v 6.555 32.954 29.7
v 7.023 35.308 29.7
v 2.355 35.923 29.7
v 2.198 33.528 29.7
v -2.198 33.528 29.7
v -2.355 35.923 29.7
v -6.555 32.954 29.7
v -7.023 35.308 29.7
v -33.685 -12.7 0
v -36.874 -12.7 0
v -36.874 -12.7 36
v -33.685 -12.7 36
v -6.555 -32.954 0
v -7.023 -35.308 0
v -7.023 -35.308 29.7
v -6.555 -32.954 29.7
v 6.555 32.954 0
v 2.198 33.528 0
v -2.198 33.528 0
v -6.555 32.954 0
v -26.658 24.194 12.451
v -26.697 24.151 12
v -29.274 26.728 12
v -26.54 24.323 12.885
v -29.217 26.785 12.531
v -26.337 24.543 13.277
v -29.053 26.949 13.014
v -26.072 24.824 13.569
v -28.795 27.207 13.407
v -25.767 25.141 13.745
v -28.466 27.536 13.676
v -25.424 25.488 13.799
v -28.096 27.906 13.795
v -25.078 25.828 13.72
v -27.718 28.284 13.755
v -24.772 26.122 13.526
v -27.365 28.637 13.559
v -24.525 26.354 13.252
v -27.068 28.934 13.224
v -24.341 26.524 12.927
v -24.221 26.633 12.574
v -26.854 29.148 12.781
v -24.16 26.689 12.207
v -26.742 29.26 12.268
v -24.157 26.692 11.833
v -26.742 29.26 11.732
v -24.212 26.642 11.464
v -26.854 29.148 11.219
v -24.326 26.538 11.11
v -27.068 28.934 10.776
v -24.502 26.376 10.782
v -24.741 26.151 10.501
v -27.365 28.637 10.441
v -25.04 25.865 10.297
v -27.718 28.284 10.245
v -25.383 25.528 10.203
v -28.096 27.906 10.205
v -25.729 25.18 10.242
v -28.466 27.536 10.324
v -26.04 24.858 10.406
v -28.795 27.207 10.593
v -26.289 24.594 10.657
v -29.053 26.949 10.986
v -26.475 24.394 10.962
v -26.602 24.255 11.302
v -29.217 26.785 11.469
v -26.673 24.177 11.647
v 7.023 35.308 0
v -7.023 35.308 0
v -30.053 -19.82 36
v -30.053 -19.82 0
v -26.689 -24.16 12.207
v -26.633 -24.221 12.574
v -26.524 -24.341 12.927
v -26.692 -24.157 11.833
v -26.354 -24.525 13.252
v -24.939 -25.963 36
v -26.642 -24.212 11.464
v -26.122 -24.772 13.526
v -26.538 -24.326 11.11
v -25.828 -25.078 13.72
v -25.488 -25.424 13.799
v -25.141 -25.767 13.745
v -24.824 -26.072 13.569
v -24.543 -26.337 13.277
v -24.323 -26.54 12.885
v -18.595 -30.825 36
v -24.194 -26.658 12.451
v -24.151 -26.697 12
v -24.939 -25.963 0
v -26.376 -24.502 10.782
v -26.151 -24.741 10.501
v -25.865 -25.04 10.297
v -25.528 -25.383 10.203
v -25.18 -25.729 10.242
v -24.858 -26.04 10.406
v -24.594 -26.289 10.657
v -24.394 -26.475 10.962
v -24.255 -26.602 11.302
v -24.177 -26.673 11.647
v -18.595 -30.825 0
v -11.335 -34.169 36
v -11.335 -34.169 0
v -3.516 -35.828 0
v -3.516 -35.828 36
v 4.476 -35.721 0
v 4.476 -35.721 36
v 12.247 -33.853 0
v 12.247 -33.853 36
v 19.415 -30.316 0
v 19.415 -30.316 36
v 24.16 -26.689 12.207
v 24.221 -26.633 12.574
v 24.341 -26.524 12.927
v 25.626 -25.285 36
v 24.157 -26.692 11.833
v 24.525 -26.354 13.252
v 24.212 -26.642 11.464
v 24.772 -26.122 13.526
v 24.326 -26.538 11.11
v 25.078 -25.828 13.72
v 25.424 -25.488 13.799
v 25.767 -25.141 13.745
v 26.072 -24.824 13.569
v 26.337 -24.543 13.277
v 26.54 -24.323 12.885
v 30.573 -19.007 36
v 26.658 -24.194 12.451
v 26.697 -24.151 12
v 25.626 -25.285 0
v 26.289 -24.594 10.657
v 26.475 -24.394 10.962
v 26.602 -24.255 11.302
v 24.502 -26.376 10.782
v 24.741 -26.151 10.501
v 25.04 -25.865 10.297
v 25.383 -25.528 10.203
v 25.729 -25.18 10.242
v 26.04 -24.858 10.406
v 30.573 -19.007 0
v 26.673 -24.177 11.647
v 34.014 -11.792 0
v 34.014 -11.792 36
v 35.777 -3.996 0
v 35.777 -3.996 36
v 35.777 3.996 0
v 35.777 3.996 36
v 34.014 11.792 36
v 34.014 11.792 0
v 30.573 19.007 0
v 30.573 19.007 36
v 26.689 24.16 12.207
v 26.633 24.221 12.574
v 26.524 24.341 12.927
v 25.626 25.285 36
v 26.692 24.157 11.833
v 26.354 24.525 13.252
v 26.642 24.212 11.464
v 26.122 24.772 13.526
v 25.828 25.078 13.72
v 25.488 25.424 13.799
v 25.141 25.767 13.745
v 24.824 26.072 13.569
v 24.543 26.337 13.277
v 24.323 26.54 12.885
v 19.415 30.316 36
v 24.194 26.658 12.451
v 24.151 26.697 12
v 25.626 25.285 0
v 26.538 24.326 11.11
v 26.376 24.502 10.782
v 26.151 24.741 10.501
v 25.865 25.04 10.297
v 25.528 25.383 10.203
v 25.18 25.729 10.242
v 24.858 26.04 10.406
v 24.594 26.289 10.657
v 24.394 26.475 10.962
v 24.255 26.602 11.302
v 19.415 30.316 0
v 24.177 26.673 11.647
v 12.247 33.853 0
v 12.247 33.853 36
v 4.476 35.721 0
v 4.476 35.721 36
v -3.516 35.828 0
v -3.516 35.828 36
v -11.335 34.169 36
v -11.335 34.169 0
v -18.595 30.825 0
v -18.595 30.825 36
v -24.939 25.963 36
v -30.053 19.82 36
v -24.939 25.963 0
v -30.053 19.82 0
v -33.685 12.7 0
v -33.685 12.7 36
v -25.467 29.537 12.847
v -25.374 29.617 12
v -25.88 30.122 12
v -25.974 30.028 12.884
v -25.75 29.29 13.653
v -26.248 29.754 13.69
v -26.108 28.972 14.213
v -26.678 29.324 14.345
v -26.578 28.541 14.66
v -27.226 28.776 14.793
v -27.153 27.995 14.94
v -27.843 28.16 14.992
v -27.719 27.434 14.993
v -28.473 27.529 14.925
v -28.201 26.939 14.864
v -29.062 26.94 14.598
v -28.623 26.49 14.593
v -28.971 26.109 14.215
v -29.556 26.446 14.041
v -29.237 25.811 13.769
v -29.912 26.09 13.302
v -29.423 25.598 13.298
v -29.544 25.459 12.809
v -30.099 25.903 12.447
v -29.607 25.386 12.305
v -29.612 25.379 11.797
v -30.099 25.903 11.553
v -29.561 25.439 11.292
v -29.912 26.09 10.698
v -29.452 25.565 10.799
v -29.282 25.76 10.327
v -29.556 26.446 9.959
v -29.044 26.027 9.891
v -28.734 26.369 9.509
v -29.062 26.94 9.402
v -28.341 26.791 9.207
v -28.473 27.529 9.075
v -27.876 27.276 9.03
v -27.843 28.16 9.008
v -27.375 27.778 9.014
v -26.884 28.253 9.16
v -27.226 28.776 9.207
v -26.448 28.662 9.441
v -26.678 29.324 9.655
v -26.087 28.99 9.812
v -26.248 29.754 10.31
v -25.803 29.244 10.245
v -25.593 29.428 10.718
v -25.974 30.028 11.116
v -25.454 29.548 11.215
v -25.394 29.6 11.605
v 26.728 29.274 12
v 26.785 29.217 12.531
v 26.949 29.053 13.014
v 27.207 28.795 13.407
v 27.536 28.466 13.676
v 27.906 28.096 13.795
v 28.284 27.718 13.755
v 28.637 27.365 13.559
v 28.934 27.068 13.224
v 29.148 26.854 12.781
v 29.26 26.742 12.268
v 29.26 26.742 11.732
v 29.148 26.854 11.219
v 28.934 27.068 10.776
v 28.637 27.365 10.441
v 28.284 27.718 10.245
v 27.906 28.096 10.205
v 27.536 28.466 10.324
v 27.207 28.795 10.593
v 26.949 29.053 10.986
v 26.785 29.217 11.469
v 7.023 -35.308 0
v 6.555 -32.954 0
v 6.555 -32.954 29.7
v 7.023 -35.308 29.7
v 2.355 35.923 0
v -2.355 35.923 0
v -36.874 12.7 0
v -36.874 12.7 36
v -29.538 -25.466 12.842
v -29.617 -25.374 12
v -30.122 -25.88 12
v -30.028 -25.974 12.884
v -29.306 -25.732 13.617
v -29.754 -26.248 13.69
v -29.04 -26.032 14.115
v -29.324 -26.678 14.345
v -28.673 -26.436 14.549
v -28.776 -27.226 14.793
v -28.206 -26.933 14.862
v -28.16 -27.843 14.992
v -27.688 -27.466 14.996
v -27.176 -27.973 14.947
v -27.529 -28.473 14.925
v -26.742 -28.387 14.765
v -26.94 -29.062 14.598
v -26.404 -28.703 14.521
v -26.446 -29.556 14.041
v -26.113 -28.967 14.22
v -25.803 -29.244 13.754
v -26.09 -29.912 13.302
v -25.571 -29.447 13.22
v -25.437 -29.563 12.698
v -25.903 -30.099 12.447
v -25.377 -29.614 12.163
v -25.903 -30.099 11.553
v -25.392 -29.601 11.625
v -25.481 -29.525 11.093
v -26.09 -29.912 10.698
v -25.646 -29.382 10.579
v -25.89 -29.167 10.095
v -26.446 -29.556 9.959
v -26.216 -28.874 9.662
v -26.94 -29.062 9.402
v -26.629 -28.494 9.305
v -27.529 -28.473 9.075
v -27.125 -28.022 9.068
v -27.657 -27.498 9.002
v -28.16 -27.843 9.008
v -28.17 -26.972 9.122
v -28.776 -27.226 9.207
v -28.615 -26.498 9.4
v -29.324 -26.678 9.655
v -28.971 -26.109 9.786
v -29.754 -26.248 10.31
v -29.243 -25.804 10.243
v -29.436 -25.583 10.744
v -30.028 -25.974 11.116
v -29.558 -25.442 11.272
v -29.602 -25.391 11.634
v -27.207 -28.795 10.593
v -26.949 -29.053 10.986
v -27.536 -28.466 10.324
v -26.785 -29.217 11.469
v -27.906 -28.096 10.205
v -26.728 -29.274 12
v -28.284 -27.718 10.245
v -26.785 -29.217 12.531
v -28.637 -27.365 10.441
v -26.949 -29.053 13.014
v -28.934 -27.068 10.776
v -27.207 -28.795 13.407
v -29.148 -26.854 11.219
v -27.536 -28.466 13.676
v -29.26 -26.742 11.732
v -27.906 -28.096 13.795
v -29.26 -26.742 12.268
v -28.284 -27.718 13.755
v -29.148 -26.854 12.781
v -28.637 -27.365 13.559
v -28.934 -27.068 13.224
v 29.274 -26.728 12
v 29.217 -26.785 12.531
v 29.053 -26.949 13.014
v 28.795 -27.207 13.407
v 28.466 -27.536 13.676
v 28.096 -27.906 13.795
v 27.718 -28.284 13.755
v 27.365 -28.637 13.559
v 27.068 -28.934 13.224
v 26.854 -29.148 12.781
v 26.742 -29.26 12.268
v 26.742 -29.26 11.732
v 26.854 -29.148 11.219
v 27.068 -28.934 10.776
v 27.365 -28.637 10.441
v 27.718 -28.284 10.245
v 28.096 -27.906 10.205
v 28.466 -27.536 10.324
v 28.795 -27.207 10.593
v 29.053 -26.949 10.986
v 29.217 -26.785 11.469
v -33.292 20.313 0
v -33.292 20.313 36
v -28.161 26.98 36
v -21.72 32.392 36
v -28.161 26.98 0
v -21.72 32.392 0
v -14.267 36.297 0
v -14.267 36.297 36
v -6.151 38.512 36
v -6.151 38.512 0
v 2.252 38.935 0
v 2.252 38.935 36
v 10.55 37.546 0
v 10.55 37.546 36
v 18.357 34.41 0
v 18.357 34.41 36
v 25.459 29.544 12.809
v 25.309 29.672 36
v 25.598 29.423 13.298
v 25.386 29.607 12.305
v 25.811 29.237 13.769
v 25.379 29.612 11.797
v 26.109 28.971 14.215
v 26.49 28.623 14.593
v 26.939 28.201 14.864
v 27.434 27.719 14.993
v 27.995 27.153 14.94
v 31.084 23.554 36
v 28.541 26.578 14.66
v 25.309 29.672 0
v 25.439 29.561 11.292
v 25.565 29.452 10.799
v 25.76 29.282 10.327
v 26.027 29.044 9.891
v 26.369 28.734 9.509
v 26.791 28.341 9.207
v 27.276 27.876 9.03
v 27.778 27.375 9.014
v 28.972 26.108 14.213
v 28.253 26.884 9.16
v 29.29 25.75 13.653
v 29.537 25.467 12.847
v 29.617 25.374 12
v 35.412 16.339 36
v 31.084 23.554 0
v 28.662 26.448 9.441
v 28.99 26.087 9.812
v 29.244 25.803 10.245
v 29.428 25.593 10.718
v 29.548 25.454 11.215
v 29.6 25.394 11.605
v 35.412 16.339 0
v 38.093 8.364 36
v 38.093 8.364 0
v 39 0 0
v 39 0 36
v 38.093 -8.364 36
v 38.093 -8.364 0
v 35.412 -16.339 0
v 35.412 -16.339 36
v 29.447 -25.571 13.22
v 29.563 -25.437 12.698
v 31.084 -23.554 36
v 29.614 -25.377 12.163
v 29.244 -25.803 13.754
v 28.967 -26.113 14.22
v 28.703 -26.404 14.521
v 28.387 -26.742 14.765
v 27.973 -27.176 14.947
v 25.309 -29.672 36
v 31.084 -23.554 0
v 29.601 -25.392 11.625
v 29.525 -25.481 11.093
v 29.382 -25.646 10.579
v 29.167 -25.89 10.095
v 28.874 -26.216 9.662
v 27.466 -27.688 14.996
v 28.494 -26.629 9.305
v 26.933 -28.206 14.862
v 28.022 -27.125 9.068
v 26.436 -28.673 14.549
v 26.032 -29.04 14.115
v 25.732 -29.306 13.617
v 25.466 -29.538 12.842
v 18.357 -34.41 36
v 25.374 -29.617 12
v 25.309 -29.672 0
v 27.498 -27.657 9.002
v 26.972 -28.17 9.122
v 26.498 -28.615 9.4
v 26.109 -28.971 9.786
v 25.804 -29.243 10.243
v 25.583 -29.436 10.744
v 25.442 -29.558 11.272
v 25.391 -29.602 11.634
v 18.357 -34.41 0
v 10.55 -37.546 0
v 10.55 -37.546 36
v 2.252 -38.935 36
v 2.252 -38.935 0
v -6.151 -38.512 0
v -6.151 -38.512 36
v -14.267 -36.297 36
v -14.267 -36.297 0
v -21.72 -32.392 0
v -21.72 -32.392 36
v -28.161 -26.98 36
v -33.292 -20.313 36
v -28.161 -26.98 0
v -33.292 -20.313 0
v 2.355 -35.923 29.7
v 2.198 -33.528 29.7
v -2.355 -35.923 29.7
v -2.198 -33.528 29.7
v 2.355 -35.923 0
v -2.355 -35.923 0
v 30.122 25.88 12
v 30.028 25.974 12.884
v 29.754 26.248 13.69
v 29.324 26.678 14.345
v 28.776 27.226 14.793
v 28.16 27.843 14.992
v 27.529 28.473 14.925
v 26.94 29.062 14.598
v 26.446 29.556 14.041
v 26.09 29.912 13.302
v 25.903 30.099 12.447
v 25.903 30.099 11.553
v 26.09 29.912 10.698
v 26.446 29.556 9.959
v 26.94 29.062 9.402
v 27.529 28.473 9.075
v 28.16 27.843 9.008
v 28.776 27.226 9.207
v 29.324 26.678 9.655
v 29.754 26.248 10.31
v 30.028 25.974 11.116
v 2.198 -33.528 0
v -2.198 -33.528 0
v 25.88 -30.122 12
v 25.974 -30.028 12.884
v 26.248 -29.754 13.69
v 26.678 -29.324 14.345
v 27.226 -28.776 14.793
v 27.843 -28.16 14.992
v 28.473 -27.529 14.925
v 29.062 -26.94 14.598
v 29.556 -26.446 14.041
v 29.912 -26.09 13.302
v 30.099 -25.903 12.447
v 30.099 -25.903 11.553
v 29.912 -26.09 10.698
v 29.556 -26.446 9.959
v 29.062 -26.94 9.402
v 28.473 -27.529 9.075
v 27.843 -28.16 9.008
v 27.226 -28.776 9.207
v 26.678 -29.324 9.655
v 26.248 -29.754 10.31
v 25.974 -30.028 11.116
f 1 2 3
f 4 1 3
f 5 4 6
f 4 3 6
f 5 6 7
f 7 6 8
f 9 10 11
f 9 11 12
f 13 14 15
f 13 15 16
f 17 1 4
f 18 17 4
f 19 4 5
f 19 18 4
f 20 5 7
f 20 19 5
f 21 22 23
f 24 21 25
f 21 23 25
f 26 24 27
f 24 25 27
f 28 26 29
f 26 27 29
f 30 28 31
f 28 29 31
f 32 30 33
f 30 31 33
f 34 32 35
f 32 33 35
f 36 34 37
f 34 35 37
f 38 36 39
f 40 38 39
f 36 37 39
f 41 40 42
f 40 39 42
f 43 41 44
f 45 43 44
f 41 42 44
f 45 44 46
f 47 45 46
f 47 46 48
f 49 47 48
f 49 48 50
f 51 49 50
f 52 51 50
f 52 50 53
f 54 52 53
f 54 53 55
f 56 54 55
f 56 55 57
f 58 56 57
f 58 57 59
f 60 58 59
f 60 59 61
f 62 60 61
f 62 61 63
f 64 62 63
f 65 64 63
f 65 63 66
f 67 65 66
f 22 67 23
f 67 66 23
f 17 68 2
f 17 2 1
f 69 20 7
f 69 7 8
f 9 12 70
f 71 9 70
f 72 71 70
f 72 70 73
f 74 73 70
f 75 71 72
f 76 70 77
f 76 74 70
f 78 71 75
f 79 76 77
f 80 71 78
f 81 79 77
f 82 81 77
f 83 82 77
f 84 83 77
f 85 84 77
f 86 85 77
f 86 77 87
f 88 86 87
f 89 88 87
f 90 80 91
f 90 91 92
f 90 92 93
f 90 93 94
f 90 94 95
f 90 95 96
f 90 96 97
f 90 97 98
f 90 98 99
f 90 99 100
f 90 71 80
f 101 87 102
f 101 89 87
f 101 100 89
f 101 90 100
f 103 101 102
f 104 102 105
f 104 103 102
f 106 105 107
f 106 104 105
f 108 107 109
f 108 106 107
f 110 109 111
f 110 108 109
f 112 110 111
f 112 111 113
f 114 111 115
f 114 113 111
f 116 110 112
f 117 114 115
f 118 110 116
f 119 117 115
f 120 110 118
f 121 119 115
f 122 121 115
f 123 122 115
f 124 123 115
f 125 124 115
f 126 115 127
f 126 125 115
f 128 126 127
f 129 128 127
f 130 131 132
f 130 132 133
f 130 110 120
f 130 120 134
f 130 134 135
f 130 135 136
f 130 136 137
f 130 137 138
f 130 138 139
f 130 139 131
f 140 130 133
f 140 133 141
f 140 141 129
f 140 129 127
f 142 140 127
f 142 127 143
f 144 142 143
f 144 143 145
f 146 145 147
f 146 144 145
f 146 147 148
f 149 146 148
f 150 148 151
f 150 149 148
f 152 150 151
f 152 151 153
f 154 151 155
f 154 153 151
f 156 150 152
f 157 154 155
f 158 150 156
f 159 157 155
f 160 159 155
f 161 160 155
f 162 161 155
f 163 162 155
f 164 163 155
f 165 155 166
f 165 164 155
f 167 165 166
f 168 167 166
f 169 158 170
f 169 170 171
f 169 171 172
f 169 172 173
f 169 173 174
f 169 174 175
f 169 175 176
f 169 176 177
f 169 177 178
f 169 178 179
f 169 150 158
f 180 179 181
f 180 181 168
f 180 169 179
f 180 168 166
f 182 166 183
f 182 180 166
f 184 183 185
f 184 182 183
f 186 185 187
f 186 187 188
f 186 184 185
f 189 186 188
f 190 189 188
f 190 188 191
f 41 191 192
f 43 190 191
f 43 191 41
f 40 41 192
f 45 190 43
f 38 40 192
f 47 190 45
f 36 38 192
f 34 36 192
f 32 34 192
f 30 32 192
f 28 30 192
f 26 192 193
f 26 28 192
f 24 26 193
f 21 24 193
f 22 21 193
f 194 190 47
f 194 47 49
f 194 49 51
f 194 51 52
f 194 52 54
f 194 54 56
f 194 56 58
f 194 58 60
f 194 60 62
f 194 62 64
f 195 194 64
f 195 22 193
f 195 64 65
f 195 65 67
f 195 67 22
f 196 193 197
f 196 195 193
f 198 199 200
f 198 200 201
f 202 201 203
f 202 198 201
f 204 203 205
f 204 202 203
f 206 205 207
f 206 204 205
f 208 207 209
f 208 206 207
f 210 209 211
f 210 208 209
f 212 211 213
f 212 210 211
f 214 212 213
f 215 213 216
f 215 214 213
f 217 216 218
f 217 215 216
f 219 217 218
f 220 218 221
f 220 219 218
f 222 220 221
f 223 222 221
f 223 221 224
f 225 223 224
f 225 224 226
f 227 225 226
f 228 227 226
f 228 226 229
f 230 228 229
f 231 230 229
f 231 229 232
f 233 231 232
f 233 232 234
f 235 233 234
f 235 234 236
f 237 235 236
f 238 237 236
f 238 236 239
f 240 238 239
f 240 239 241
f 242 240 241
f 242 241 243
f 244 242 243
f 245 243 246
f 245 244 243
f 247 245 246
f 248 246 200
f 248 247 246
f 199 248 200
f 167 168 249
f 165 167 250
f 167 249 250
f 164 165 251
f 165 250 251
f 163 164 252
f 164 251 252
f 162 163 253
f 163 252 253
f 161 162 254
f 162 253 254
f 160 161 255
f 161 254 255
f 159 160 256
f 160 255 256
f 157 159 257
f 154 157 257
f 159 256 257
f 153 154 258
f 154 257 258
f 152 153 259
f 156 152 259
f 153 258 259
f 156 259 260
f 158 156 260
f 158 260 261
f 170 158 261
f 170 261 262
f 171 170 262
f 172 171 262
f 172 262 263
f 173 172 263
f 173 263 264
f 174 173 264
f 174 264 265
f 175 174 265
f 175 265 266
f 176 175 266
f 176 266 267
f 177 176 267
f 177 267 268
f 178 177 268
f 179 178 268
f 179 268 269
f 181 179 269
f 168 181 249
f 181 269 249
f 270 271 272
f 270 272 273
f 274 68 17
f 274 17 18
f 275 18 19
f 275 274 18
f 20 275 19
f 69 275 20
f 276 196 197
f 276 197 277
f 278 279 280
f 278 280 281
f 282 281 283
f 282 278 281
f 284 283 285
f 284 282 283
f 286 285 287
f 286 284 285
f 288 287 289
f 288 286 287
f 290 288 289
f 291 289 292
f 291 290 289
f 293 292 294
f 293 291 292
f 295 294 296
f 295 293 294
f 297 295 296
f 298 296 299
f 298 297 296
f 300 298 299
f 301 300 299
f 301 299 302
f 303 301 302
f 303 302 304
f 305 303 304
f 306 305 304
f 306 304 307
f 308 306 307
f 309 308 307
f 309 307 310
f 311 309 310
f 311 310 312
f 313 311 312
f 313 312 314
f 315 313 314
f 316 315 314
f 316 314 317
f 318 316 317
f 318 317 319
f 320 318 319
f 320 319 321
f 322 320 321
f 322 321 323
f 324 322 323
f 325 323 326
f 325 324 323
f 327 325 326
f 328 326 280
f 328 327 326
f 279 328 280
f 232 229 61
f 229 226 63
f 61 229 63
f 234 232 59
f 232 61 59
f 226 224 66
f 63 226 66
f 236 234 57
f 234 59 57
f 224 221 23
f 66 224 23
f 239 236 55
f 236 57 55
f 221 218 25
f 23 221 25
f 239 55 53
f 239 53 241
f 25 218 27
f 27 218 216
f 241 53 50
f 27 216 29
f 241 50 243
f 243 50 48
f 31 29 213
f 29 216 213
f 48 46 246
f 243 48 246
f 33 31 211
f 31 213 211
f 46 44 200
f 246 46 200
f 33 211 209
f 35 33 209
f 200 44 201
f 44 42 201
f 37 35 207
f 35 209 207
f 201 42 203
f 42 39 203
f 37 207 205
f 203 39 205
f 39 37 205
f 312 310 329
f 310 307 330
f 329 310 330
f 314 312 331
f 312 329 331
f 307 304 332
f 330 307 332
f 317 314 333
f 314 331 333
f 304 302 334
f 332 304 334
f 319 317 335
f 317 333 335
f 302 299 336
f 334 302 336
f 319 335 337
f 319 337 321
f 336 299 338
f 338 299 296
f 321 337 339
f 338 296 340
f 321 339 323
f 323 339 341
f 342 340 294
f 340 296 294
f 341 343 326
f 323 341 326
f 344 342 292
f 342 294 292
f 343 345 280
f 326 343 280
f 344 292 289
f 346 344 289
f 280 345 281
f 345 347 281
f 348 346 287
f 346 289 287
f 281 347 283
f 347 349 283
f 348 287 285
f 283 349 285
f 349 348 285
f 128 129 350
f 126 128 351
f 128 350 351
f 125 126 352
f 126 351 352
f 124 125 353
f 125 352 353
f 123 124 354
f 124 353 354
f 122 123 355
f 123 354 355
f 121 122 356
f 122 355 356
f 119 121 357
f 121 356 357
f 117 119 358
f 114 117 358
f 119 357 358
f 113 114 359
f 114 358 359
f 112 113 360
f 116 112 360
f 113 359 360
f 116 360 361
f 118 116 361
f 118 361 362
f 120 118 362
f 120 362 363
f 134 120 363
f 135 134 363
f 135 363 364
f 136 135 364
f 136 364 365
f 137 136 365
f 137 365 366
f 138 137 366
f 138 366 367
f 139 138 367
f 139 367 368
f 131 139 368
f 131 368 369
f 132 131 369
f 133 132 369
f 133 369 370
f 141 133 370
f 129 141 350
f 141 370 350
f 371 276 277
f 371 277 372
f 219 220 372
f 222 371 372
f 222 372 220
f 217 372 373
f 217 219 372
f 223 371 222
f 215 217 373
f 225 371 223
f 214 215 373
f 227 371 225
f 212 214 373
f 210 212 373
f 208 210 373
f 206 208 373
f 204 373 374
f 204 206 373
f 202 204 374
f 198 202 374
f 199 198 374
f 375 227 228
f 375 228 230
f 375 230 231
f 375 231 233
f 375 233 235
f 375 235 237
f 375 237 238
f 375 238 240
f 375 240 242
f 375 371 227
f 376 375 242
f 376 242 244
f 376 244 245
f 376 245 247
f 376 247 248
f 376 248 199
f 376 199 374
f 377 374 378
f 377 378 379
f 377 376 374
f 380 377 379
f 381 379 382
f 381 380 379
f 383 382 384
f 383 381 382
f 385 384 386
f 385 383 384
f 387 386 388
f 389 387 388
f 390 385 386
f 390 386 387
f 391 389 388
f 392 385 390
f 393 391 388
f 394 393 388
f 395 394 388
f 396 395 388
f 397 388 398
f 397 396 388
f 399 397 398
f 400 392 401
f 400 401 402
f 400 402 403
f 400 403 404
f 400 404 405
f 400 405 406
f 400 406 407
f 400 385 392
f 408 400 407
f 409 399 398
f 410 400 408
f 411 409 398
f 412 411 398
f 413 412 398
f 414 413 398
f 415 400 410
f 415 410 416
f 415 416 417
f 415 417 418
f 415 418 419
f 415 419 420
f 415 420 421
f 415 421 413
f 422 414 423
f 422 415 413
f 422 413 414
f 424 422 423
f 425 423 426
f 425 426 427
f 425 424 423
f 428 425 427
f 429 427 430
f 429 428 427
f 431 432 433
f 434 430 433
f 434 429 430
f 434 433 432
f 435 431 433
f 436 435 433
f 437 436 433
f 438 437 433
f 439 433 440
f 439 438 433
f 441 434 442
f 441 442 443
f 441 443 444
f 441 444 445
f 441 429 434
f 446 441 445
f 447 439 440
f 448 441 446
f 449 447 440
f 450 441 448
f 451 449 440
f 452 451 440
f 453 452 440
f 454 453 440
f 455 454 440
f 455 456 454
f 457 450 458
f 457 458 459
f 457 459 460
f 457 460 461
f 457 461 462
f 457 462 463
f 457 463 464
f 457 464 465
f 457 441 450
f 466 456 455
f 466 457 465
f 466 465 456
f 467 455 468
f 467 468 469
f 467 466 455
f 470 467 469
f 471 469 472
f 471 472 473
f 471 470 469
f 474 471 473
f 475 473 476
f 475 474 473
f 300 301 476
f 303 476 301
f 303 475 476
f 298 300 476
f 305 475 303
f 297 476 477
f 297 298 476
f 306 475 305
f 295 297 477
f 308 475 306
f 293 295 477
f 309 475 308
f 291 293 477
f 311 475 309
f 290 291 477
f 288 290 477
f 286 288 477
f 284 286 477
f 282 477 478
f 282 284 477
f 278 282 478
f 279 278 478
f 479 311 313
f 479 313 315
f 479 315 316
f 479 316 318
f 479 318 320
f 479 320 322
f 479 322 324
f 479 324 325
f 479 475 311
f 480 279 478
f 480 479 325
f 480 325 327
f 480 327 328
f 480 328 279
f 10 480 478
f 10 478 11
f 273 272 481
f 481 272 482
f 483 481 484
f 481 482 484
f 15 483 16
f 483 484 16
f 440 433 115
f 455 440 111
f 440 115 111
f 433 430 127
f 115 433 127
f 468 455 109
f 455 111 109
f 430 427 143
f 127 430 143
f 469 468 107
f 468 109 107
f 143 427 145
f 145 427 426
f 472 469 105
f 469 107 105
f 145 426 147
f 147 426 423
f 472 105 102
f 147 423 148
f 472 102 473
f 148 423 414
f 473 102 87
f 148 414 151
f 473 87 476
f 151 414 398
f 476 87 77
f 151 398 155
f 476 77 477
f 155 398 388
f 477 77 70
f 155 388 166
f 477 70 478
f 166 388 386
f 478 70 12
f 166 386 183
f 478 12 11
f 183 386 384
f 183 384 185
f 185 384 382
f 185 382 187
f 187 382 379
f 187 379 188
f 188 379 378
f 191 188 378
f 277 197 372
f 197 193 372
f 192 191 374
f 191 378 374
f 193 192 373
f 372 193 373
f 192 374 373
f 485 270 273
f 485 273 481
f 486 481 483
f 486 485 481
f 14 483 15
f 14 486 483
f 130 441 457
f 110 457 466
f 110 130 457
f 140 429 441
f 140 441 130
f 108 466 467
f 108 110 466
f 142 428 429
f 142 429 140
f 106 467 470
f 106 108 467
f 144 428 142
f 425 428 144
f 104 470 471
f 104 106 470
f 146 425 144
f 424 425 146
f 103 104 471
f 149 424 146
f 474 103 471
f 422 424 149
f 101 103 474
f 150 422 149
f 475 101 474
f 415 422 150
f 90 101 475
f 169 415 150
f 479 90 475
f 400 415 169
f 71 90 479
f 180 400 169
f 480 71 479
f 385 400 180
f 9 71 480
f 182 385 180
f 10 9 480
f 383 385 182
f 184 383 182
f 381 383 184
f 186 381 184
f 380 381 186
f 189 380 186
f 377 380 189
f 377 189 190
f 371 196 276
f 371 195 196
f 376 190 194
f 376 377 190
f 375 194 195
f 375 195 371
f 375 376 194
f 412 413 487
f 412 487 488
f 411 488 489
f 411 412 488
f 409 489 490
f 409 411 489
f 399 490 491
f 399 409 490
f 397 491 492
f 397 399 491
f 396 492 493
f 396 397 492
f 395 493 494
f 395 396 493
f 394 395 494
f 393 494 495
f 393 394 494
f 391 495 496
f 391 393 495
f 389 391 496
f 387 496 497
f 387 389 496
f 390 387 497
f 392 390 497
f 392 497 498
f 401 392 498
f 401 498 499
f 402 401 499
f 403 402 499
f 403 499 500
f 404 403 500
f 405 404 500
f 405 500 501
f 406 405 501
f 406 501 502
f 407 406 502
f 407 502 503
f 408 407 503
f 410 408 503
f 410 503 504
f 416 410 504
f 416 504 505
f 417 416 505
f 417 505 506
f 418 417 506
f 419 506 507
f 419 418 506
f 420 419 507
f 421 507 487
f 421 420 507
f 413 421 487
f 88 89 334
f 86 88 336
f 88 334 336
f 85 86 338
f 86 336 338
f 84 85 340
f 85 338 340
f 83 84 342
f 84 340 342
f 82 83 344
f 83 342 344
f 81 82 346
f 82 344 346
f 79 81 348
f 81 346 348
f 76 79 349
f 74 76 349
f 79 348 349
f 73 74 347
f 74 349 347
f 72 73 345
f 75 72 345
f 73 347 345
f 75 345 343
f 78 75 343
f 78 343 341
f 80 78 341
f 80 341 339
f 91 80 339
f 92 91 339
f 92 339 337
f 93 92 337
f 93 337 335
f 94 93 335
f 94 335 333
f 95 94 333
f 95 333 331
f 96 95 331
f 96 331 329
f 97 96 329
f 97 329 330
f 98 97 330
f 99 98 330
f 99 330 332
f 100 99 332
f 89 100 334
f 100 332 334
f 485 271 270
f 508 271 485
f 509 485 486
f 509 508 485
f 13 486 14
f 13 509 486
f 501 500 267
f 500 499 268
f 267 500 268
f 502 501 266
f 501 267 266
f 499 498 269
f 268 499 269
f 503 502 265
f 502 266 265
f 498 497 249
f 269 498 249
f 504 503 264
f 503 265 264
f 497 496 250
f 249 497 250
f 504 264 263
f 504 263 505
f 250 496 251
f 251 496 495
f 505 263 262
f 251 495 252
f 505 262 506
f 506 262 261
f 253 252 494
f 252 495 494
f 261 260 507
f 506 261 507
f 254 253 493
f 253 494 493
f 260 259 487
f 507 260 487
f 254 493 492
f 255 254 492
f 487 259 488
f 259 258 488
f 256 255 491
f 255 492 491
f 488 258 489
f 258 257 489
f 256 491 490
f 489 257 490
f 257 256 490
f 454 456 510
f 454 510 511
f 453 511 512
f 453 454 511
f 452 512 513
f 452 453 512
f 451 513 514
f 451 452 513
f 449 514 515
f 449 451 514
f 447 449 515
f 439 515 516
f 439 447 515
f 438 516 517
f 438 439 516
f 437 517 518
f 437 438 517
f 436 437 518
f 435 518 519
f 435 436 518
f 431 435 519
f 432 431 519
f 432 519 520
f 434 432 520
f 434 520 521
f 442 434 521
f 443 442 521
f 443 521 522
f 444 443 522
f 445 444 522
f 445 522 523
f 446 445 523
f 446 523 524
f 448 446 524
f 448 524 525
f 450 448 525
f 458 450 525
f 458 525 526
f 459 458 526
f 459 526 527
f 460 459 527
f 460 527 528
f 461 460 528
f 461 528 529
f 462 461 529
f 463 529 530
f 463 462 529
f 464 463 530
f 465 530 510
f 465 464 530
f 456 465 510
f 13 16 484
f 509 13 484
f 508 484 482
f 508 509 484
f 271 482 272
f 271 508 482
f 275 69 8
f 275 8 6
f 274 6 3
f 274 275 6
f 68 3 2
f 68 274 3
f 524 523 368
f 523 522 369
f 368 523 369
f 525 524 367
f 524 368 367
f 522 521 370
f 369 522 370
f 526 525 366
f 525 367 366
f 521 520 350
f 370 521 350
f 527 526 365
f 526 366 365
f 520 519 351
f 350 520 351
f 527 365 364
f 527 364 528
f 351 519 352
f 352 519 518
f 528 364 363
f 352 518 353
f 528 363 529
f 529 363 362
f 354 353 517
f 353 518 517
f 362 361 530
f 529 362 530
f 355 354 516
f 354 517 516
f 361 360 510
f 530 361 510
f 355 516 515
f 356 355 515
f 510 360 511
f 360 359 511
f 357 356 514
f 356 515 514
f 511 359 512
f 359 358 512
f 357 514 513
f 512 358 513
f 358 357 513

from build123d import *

# Parameters (mm, degrees)
BOSS_EXTRUDE1_DEPTH     = 36
BOSS_EXTRUDE2_DEPTH     = 29.7
BOSS_EXTRUDE2_2_DEPTH   = 29.7
SKETCH3_R               = 3
BOSS_EXTRUDE3_DEPTH     = 1.8
CUT_EXTRUDE1_REACH      = 103.362
CUT_EXTRUDE1_END_RADIUS = 36
SKETCH4_R               = 1.8
CIRPATTERN1_COUNT       = 4


with BuildPart() as part:
    # Sketch1 → Boss-Extrude1 (new body)
    with BuildSketch(Plane.XY):
        with BuildLine():
            Line((-33.685456803, 12.7), (-36.874245755, 12.7))
            ThreePointArc((-36.874245755, 12.7), (39, 0), (-36.874245755, -12.7))
            Line((-36.874245755, -12.7), (-33.685456803, -12.7))
            ThreePointArc((-33.685456803, -12.7), (36, 0), (-33.685456803, 12.7))
        make_face()
    extrude(amount=BOSS_EXTRUDE1_DEPTH)

    # Sketch3 → Boss-Extrude3 (add)
    with BuildSketch(Plane(origin=(-26.728262307, 26.728262307, 0), x_dir=(0, 0, -1), z_dir=(0.7071067811865464, -0.7071067811865488, 0))):
        with Locations(Location((-12, 0, 0), (0, 0, 90))):
            Circle(SKETCH3_R)
    boss_extrude3 = extrude(amount=-BOSS_EXTRUDE3_DEPTH)

    # Cut-Extrude1: up to this cylinder (the profile starts outside it)
    cut_extrude1_end = Plane(origin=(0, 0, 12), z_dir=(0, 0, -1)) * Cylinder(CUT_EXTRUDE1_END_RADIUS, 279.724, mode=Mode.PRIVATE)
    # Sketch4 → Cut-Extrude1 (cut, up to the surface)
    with BuildSketch(Plane(origin=(-28.001054513, 28.001054513, 0), x_dir=(0, 0, 1), z_dir=(-0.7071067811865465, 0.7071067811865487, 0)), mode=Mode.PRIVATE) as cut_extrude1_sk1:
        with Locations(Location((12, 0, 0), (0, 0, 270))):
            Circle(SKETCH4_R)
    cut_extrude1_tool1 = extrude(cut_extrude1_sk1.sketch, amount=-CUT_EXTRUDE1_REACH, mode=Mode.PRIVATE) - cut_extrude1_end
    cut_extrude1 = cut_extrude1_tool1.solids().sort_by_distance((-28.001055, 28.001055, 12))[0]
    add(cut_extrude1, mode=Mode.SUBTRACT)

    # CirPattern1: Boss-Extrude3, Cut-Extrude1 ×4 about axis
    cirpattern1_axis = Axis((0, 0, 0), (0, 0, 1))
    add([boss_extrude3.rotate(cirpattern1_axis, i * 360 / CIRPATTERN1_COUNT) for i in range(1, CIRPATTERN1_COUNT)])
    add([cut_extrude1.rotate(cirpattern1_axis, i * 360 / CIRPATTERN1_COUNT) for i in range(1, CIRPATTERN1_COUNT)], mode=Mode.SUBTRACT)


with BuildPart() as body_2:
    # Sketch2 → Boss-Extrude2 (new body)
    with BuildSketch(Plane(origin=(0, 0, 0), x_dir=(-1, 0, 0), z_dir=(0, 0, -1))):
        with BuildLine():
            Line((-7.023251593, 35.308270095), (-6.55503482, 32.954385422))
            ThreePointArc((-6.55503482, 32.954385422), (0, 33.6), (6.55503482, 32.954385422))
            Line((6.55503482, 32.954385422), (7.023251593, 35.308270095))
            ThreePointArc((7.023251593, 35.308270095), (0, 36), (-7.023251593, 35.308270095))
        make_face()
    extrude(amount=-BOSS_EXTRUDE2_DEPTH)


with BuildPart() as body_3:
    # Sketch2 → Boss-Extrude2 2 (new body)
    with BuildSketch(Plane(origin=(0, 0, 0), x_dir=(-1, 0, 0), z_dir=(0, 0, -1))):
        with BuildLine():
            Line((7.023251593, -35.308270095), (6.55503482, -32.954385422))
            ThreePointArc((6.55503482, -32.954385422), (0, -33.6), (-6.55503482, -32.954385422))
            Line((-6.55503482, -32.954385422), (-7.023251593, -35.308270095))
            ThreePointArc((-7.023251593, -35.308270095), (0, -36), (7.023251593, -35.308270095))
        make_face()
    extrude(amount=-BOSS_EXTRUDE2_2_DEPTH)


solid = Compound([part.part, body_2.part, body_3.part])
